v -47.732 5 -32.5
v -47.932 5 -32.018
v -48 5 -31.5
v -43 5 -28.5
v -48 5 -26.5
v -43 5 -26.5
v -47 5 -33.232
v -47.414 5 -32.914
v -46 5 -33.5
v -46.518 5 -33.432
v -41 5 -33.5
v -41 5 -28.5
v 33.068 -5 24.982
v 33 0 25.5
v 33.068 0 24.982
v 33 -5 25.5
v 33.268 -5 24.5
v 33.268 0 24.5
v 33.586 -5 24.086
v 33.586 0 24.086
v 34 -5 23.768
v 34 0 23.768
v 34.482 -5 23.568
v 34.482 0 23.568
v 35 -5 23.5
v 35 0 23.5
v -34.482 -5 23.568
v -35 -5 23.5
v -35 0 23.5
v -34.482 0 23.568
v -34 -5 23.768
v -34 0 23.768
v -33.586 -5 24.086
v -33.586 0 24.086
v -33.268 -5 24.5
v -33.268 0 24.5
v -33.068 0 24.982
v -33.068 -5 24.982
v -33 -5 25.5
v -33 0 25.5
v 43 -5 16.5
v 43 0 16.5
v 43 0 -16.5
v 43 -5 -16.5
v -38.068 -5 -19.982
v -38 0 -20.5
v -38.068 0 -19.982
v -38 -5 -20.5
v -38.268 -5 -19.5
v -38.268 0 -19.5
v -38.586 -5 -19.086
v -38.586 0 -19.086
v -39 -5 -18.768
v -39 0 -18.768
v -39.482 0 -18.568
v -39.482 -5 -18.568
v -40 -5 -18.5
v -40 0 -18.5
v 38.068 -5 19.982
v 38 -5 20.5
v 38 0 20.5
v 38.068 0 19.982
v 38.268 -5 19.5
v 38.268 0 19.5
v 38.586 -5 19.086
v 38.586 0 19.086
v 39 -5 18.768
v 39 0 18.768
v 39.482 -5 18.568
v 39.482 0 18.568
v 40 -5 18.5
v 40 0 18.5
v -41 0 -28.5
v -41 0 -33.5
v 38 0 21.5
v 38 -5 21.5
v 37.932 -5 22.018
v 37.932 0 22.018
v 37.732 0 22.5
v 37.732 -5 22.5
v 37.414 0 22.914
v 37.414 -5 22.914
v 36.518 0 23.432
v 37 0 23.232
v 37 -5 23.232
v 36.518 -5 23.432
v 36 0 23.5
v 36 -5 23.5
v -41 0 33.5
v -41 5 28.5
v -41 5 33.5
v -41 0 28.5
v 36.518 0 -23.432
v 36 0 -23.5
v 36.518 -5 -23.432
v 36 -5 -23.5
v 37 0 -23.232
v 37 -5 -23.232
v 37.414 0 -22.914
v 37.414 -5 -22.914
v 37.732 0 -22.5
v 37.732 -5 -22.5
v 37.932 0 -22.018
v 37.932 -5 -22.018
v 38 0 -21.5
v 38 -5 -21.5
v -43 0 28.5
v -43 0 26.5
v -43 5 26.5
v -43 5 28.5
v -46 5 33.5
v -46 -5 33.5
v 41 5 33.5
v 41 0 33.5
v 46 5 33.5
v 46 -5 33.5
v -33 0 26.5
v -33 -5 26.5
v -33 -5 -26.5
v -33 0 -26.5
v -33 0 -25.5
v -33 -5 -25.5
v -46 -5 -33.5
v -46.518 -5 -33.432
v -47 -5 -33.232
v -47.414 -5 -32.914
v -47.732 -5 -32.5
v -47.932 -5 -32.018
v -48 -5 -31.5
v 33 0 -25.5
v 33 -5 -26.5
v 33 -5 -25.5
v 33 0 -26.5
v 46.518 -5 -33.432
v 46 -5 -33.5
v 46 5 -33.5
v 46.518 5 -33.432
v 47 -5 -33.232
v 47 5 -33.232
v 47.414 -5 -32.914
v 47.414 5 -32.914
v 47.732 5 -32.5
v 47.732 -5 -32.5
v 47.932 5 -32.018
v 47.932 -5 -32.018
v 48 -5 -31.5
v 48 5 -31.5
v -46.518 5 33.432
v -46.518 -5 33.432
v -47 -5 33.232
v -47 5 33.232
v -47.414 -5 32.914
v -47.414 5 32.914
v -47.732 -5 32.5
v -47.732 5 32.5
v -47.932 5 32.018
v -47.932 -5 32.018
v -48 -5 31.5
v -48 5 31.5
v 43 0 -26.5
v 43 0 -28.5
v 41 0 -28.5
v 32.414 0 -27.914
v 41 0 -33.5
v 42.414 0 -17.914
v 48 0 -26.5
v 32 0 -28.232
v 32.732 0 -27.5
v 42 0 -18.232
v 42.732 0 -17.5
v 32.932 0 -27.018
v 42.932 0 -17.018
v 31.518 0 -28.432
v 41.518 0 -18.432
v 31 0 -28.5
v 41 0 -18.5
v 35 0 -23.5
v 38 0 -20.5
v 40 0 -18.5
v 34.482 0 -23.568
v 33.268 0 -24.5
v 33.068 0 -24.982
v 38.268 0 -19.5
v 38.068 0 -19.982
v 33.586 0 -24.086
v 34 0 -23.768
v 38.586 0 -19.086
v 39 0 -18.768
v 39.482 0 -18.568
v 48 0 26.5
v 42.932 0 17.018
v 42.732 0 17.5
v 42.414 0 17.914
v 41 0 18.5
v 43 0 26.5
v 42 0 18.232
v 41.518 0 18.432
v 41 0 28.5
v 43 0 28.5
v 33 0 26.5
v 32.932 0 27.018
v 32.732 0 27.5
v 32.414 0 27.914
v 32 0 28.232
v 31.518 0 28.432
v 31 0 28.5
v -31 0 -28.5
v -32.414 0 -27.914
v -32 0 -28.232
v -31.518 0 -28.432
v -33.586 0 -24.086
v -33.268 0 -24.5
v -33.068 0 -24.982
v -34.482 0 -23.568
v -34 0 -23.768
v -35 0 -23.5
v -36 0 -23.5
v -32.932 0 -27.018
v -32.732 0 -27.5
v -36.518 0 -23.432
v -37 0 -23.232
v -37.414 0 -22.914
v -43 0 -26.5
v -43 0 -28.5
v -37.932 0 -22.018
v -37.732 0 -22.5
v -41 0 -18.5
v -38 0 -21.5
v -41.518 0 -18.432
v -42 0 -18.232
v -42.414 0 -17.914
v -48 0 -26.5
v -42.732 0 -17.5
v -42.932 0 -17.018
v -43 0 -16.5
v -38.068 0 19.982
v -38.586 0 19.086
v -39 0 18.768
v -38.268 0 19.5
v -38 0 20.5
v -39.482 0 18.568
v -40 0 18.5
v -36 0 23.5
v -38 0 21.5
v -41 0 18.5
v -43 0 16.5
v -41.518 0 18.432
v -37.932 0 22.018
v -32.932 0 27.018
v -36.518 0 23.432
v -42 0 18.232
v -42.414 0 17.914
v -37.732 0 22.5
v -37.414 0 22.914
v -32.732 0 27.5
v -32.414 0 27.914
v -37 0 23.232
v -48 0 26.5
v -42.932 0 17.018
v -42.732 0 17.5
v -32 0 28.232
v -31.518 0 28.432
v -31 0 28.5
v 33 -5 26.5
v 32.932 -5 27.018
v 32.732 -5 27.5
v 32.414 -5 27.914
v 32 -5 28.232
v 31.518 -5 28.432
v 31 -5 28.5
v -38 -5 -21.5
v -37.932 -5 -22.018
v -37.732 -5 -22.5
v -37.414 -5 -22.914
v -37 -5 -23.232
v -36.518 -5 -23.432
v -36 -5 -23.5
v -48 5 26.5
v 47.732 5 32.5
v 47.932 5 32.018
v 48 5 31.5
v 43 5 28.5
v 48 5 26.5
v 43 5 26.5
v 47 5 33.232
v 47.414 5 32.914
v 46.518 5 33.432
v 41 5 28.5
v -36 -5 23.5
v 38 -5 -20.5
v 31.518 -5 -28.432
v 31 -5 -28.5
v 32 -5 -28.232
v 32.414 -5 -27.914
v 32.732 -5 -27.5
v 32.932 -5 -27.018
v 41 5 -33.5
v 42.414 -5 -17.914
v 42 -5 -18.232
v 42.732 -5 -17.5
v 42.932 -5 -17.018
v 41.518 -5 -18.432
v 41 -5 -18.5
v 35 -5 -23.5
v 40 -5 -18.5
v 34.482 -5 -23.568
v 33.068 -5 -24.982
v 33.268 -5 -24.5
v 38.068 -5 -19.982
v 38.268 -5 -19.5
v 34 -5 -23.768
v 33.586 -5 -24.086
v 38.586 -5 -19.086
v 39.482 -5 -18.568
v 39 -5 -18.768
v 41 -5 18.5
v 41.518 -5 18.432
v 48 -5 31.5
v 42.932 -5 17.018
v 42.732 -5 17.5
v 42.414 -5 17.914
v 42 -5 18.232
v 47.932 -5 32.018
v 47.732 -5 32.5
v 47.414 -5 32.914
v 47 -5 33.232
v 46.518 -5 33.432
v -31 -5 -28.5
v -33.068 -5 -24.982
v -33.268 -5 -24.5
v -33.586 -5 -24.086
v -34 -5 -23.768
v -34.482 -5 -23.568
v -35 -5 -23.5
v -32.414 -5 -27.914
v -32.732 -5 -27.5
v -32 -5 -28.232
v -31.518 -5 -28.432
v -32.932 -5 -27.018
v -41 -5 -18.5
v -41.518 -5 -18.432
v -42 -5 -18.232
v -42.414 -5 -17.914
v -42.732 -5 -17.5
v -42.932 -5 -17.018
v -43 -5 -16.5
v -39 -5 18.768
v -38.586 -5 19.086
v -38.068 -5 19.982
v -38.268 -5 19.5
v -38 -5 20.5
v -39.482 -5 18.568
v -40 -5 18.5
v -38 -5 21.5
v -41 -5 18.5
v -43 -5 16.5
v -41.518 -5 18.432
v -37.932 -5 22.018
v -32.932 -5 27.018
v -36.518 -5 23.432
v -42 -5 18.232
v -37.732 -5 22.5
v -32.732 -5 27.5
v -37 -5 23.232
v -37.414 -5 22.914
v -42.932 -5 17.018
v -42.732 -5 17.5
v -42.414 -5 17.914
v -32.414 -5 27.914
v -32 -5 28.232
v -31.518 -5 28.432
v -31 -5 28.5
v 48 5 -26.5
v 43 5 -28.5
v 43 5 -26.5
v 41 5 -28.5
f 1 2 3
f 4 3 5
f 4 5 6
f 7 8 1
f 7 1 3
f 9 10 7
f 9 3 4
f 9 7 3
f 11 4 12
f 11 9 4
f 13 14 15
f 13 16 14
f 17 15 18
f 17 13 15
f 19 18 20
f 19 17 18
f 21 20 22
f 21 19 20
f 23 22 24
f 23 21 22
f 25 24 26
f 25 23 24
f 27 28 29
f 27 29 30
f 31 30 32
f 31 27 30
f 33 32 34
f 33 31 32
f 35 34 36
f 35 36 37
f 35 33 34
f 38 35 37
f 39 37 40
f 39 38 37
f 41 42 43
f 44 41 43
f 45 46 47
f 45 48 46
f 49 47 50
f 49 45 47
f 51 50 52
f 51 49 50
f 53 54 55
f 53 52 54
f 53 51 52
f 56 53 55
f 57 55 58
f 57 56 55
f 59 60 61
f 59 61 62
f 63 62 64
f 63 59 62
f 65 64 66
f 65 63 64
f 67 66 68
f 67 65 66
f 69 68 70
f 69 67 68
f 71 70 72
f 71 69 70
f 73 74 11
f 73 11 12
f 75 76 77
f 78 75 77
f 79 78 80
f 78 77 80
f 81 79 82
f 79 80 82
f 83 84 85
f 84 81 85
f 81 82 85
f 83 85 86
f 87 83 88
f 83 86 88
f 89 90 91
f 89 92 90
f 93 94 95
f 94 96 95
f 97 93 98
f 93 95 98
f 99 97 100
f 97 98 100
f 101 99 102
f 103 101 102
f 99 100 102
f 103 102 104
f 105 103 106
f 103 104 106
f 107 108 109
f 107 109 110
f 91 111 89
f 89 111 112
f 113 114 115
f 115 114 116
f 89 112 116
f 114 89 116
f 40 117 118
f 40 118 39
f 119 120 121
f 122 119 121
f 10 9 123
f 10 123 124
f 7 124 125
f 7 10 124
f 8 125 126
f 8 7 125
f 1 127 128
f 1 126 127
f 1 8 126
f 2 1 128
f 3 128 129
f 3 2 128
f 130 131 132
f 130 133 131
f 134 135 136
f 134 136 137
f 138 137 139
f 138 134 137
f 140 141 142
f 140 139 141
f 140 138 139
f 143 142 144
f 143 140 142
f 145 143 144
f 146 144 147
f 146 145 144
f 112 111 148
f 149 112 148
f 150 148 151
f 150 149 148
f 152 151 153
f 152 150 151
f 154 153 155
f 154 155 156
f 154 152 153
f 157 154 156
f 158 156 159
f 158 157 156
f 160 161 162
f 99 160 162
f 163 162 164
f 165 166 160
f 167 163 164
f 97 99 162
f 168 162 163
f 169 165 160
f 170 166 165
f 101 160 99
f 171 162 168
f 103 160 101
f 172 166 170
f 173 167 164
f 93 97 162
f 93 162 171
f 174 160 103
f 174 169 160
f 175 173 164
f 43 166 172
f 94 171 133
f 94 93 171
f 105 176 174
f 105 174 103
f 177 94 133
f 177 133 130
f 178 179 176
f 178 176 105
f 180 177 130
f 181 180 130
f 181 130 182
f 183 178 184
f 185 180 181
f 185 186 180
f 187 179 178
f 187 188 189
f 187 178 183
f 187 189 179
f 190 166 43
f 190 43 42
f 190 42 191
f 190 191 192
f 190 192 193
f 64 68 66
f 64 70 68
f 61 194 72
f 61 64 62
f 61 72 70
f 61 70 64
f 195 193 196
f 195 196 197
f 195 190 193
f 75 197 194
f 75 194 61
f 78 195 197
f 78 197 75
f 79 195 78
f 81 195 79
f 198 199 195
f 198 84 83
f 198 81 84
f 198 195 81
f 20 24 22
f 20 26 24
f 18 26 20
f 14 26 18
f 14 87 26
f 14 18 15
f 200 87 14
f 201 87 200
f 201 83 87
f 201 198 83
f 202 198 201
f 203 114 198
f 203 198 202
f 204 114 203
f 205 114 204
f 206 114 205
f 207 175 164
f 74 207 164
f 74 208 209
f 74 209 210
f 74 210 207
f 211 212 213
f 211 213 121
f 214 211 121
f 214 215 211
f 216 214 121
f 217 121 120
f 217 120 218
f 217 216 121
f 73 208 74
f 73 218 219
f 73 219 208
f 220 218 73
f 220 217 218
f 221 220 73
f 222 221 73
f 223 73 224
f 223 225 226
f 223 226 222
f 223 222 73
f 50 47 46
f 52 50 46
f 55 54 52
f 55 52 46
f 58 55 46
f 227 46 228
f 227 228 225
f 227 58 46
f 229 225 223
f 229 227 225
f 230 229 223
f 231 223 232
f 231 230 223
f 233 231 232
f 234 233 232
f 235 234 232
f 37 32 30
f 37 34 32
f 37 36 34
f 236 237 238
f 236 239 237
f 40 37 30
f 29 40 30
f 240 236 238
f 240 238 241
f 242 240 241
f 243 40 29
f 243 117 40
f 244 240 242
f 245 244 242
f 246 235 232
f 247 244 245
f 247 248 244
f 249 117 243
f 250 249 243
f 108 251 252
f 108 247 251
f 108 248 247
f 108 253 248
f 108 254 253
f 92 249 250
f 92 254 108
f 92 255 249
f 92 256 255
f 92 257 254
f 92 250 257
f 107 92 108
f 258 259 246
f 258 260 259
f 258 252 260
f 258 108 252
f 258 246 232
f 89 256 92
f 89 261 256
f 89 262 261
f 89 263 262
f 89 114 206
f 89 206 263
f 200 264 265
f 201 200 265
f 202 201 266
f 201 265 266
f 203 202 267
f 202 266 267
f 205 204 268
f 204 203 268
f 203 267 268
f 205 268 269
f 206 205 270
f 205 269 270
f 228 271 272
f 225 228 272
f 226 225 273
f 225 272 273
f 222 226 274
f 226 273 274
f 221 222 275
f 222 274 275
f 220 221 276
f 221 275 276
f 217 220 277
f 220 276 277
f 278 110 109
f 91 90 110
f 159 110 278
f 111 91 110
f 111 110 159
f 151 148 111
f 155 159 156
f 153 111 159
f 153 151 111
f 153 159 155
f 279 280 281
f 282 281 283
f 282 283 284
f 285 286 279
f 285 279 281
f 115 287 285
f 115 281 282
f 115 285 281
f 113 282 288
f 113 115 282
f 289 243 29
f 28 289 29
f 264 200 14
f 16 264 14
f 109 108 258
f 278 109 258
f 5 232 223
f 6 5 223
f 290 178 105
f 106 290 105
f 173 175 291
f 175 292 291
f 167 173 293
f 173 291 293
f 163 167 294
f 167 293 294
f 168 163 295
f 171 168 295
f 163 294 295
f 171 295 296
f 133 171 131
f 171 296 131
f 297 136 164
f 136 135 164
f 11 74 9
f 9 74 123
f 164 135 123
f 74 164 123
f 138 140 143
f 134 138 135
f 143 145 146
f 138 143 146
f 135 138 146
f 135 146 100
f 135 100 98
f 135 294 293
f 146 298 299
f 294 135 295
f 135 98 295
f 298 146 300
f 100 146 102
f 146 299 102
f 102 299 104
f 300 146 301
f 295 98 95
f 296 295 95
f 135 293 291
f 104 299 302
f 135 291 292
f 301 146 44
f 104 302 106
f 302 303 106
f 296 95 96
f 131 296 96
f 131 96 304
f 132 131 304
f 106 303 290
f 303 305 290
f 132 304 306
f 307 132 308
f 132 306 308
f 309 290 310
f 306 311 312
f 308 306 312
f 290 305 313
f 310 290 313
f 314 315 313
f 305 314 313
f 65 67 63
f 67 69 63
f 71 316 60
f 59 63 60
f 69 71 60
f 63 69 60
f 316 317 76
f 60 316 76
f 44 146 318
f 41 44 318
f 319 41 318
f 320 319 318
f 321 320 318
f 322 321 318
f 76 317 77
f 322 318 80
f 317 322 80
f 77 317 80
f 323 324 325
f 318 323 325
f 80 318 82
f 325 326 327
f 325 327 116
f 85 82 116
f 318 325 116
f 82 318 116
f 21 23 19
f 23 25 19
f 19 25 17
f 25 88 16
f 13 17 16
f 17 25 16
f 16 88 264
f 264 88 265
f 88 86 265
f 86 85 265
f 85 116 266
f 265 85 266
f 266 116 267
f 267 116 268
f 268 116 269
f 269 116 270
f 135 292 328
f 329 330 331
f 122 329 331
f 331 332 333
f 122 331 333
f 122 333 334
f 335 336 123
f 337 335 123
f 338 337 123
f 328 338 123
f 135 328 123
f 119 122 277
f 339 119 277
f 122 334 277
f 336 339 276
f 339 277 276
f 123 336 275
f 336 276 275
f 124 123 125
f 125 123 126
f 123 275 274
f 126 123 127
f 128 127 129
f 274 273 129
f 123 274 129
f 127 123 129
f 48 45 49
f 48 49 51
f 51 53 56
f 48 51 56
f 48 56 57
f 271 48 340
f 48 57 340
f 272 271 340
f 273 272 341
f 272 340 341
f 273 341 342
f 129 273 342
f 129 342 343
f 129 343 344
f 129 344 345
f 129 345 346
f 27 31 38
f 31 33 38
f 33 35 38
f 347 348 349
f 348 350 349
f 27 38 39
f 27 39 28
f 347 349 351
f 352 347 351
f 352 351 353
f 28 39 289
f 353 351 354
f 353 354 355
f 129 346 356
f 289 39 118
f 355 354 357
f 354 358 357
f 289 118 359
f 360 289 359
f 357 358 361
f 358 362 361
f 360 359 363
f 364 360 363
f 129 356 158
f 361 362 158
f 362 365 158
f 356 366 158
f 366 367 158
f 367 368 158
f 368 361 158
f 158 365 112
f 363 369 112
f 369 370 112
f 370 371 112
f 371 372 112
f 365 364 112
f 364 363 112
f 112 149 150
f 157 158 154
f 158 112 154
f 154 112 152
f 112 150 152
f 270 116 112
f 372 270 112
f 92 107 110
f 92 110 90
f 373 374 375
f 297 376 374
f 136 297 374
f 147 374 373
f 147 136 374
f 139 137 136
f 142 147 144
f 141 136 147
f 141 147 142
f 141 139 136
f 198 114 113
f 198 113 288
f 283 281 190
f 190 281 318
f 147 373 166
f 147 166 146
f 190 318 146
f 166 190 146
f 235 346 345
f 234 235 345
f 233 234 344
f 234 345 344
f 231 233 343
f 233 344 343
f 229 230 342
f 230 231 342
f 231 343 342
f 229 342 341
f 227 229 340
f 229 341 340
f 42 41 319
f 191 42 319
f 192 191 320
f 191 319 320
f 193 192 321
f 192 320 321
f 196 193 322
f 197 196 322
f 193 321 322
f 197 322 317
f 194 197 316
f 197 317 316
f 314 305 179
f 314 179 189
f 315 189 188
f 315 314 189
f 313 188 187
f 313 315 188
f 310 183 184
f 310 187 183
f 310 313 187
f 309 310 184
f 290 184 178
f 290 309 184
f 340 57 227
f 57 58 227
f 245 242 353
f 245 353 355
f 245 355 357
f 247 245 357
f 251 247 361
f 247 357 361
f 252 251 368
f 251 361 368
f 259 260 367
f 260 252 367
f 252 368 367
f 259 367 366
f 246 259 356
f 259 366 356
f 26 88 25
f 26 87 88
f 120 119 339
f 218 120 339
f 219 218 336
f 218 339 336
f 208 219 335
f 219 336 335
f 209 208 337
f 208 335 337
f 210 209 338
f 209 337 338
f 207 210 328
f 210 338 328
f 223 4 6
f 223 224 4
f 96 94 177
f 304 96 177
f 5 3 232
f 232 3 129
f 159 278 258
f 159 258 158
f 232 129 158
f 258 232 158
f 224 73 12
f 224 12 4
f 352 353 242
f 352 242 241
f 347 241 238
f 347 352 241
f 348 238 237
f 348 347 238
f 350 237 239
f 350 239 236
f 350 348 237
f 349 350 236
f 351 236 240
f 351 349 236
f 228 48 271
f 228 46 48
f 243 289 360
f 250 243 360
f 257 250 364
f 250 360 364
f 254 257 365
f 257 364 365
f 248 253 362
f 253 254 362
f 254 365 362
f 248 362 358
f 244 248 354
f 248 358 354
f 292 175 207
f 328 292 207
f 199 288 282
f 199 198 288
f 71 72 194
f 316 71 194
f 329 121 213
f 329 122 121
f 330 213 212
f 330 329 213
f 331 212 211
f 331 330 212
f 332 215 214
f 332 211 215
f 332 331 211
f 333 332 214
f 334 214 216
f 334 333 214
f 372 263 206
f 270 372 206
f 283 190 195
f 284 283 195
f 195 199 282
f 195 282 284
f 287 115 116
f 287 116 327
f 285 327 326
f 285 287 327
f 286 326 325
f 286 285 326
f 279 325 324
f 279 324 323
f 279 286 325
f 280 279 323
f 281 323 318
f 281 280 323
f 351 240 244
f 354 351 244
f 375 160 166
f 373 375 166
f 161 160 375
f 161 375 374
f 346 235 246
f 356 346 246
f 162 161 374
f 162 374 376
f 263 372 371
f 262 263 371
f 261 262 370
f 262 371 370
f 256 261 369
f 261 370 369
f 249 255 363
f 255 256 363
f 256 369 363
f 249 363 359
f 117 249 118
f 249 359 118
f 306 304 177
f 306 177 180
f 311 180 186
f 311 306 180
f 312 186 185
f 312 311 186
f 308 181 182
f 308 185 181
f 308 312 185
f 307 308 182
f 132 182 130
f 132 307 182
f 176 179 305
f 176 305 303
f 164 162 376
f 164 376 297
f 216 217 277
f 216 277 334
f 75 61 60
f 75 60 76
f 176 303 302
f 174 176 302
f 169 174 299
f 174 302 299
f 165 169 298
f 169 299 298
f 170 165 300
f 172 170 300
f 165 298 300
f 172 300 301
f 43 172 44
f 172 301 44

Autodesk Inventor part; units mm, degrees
ref_plane "YZ Plane" through (0, 0, 0) normal (1, 0, 0) x (0, 1, 0)
ref_plane "XZ Plane" through (0, 0, 0) normal (0, 1, 0) x (-1, 0, 0)
ref_plane "XY Plane" through (0, 0, 0) normal (0, 0, 1) x (1, 0, 0)
sketch "스케치2" plane through (0, 0, 0) normal (0, 1, 0) x (-1, 0, 0)
  line L0 (-43, 28.5) -> (43, 28.5)
  line L1 (43, 28.5) -> (43, -28.5)
  line L2 (43, -28.5) -> (-43, -28.5)
  line L3 (-43, -28.5) -> (-43, 28.5)
  line L4 (-43, 28.5) -> (43, -28.5) construction
  line L5 (43, 28.5) -> (-43, -28.5) construction
  line L6 (-48, -33.5) -> (48, -33.5)
  line L7 (48, -33.5) -> (48, 33.5)
  line L8 (48, 33.5) -> (-48, 33.5)
  line L9 (-48, 33.5) -> (-48, -33.5)
  point P0 (0, 0)
  dimension "d0" = 86
  dimension "d1" = 57
  dimension "d2" = 5
extrude "돌출1" add sketch "스케치2" against normal blind 5 contours L0 L1 L2 L3 | L9 L8 L7 L6
sketch "스케치5" plane through (0, 0, 0) normal (0, 1, 0) x (1, 0, 0)
  line L0 (-48, 33.5) -> (-48, -33.5) projected
  line L1 (-48, -33.5) -> (48, -33.5) projected
  line L2 (48, -33.5) -> (48, 33.5) projected
  line L3 (48, 33.5) -> (-48, 33.5) projected
  line L4 (-43, 28.5) -> (-43, -28.5)
  line L5 (-43, -28.5) -> (43, -28.5)
  line L6 (43, -28.5) -> (43, 28.5)
  line L7 (43, 28.5) -> (-43, 28.5)
  line L8 (-43, 28.5) -> (-33, 28.5)
  line L9 (-33, 28.5) -> (-33, 18.5)
  line L10 (-33, 18.5) -> (-43, 18.5)
  line L11 (-43, 18.5) -> (-43, 28.5)
  line L12 (-33, 18.5) -> (-38, 18.5)
  line L13 (-38, 18.5) -> (-38, 23.5)
  line L14 (-38, 23.5) -> (-33, 23.5)
  line L15 (-33, 23.5) -> (-33, 18.5)
  line L16 (-43, -28.5) -> (-33, -28.5)
  line L17 (-33, -28.5) -> (-33, -18.5)
  line L18 (-33, -18.5) -> (-43, -18.5)
  line L19 (-43, -18.5) -> (-43, -28.5)
  line L20 (-33, -18.5) -> (-38, -18.5)
  line L21 (-38, -18.5) -> (-38, -23.5)
  line L22 (-38, -23.5) -> (-33, -23.5)
  line L23 (-33, -23.5) -> (-33, -18.5)
  line L24 (43, -28.5) -> (33, -28.5)
  line L25 (33, -28.5) -> (33, -18.5)
  line L26 (33, -18.5) -> (43, -18.5)
  line L27 (43, -18.5) -> (43, -28.5)
  line L28 (33, -18.5) -> (38, -18.5)
  line L29 (38, -18.5) -> (38, -23.5)
  line L30 (38, -23.5) -> (33, -23.5)
  line L31 (33, -23.5) -> (33, -18.5)
  line L32 (43, 28.5) -> (33, 28.5)
  line L33 (33, 28.5) -> (33, 18.5)
  line L34 (33, 18.5) -> (43, 18.5)
  line L35 (43, 18.5) -> (43, 28.5)
  line L36 (33, 18.5) -> (38, 18.5)
  line L37 (38, 18.5) -> (38, 23.5)
  line L38 (38, 23.5) -> (33, 23.5)
  line L39 (33, 23.5) -> (33, 18.5)
  point P0 (0, 0)
  dimension "d10" = 5
  dimension "d11" = 10
  dimension "d12" = 10
  dimension "d13" = 5
  dimension "d14" = 5
  dimension "d15" = 10
  dimension "d16" = 10
  dimension "d17" = 5
  dimension "d18" = 5
  dimension "d19" = 10
  dimension "d20" = 10
  dimension "d21" = 5
  dimension "d22" = 5
  dimension "d23" = 10
  dimension "d24" = 10
  dimension "d25" = 5
  dimension "d26" = 5
extrude "돌출3" cut sketch "스케치5" against normal through all contours L10 L9 L7 L33 L34 L6 L26 L25 L5 L17 L18 L4 | L13 L14 L9 L10 | L18 L17 L22 L21 | L38 L37 L34 L33 | L25 L26 L29 L30
sketch "스케치3" plane through (0, 0, 0) normal (0, 1, 0) x (1, 0, 0)
  line L0 (-48, 33.5) -> (-48, -33.5) projected
  line L1 (-48, -33.5) -> (48, -33.5) projected
  line L2 (48, -33.5) -> (48, 33.5) projected
  line L3 (48, 33.5) -> (-48, 33.5) projected
  line L4 (-43, 28.5) -> (-43, -28.5)
  line L5 (-43, -28.5) -> (43, -28.5)
  line L6 (43, -28.5) -> (43, 28.5)
  line L7 (43, 28.5) -> (-43, 28.5)
  line L8 (-48, 26.5) -> (-43, 26.5)
  line L9 (-41, 33.5) -> (-41, 28.5)
  point P0 (0, 0)
  dimension "d5" = 5
  dimension "d6" = 7
  dimension "d7" = 7
extrude "돌출2" add sketch "스케치3" along normal blind 5 contours L3 L9 L7 L4 L8 L0
mirror "미러1" about plane through (0, 0, 0) normal (1, 0, 0) of "돌출2"
mirror "미러2" about plane through (0, 0, 0) normal (0, 0, 1) of "돌출2", "미러1"
fillet "모깎기1" radius 2 24 edges at (-33, -2.5, 28.5) (-33, -2.5, 23.5) (-38, -2.5, 23.5) (-38, -2.5, 18.5) (-43, -2.5, 18.5) (-48, 0, 33.5) (-48, 0, -33.5) (48, 0, -33.5) (48, 0, 33.5) (-43, -2.5, -18.5) (-38, -2.5, -18.5) (-38, -2.5, -23.5) (-33, -2.5, -23.5) (-33, -2.5, -28.5) (33, -2.5, -28.5) (33, -2.5, -23.5) (38, -2.5, -23.5) (38, -2.5, -18.5) (43, -2.5, -18.5) (43, -2.5, 18.5) (38, -2.5, 18.5) (38, -2.5, 23.5) (33, -2.5, 23.5) (33, -2.5, 28.5)
properties part number "Pi_Case"
